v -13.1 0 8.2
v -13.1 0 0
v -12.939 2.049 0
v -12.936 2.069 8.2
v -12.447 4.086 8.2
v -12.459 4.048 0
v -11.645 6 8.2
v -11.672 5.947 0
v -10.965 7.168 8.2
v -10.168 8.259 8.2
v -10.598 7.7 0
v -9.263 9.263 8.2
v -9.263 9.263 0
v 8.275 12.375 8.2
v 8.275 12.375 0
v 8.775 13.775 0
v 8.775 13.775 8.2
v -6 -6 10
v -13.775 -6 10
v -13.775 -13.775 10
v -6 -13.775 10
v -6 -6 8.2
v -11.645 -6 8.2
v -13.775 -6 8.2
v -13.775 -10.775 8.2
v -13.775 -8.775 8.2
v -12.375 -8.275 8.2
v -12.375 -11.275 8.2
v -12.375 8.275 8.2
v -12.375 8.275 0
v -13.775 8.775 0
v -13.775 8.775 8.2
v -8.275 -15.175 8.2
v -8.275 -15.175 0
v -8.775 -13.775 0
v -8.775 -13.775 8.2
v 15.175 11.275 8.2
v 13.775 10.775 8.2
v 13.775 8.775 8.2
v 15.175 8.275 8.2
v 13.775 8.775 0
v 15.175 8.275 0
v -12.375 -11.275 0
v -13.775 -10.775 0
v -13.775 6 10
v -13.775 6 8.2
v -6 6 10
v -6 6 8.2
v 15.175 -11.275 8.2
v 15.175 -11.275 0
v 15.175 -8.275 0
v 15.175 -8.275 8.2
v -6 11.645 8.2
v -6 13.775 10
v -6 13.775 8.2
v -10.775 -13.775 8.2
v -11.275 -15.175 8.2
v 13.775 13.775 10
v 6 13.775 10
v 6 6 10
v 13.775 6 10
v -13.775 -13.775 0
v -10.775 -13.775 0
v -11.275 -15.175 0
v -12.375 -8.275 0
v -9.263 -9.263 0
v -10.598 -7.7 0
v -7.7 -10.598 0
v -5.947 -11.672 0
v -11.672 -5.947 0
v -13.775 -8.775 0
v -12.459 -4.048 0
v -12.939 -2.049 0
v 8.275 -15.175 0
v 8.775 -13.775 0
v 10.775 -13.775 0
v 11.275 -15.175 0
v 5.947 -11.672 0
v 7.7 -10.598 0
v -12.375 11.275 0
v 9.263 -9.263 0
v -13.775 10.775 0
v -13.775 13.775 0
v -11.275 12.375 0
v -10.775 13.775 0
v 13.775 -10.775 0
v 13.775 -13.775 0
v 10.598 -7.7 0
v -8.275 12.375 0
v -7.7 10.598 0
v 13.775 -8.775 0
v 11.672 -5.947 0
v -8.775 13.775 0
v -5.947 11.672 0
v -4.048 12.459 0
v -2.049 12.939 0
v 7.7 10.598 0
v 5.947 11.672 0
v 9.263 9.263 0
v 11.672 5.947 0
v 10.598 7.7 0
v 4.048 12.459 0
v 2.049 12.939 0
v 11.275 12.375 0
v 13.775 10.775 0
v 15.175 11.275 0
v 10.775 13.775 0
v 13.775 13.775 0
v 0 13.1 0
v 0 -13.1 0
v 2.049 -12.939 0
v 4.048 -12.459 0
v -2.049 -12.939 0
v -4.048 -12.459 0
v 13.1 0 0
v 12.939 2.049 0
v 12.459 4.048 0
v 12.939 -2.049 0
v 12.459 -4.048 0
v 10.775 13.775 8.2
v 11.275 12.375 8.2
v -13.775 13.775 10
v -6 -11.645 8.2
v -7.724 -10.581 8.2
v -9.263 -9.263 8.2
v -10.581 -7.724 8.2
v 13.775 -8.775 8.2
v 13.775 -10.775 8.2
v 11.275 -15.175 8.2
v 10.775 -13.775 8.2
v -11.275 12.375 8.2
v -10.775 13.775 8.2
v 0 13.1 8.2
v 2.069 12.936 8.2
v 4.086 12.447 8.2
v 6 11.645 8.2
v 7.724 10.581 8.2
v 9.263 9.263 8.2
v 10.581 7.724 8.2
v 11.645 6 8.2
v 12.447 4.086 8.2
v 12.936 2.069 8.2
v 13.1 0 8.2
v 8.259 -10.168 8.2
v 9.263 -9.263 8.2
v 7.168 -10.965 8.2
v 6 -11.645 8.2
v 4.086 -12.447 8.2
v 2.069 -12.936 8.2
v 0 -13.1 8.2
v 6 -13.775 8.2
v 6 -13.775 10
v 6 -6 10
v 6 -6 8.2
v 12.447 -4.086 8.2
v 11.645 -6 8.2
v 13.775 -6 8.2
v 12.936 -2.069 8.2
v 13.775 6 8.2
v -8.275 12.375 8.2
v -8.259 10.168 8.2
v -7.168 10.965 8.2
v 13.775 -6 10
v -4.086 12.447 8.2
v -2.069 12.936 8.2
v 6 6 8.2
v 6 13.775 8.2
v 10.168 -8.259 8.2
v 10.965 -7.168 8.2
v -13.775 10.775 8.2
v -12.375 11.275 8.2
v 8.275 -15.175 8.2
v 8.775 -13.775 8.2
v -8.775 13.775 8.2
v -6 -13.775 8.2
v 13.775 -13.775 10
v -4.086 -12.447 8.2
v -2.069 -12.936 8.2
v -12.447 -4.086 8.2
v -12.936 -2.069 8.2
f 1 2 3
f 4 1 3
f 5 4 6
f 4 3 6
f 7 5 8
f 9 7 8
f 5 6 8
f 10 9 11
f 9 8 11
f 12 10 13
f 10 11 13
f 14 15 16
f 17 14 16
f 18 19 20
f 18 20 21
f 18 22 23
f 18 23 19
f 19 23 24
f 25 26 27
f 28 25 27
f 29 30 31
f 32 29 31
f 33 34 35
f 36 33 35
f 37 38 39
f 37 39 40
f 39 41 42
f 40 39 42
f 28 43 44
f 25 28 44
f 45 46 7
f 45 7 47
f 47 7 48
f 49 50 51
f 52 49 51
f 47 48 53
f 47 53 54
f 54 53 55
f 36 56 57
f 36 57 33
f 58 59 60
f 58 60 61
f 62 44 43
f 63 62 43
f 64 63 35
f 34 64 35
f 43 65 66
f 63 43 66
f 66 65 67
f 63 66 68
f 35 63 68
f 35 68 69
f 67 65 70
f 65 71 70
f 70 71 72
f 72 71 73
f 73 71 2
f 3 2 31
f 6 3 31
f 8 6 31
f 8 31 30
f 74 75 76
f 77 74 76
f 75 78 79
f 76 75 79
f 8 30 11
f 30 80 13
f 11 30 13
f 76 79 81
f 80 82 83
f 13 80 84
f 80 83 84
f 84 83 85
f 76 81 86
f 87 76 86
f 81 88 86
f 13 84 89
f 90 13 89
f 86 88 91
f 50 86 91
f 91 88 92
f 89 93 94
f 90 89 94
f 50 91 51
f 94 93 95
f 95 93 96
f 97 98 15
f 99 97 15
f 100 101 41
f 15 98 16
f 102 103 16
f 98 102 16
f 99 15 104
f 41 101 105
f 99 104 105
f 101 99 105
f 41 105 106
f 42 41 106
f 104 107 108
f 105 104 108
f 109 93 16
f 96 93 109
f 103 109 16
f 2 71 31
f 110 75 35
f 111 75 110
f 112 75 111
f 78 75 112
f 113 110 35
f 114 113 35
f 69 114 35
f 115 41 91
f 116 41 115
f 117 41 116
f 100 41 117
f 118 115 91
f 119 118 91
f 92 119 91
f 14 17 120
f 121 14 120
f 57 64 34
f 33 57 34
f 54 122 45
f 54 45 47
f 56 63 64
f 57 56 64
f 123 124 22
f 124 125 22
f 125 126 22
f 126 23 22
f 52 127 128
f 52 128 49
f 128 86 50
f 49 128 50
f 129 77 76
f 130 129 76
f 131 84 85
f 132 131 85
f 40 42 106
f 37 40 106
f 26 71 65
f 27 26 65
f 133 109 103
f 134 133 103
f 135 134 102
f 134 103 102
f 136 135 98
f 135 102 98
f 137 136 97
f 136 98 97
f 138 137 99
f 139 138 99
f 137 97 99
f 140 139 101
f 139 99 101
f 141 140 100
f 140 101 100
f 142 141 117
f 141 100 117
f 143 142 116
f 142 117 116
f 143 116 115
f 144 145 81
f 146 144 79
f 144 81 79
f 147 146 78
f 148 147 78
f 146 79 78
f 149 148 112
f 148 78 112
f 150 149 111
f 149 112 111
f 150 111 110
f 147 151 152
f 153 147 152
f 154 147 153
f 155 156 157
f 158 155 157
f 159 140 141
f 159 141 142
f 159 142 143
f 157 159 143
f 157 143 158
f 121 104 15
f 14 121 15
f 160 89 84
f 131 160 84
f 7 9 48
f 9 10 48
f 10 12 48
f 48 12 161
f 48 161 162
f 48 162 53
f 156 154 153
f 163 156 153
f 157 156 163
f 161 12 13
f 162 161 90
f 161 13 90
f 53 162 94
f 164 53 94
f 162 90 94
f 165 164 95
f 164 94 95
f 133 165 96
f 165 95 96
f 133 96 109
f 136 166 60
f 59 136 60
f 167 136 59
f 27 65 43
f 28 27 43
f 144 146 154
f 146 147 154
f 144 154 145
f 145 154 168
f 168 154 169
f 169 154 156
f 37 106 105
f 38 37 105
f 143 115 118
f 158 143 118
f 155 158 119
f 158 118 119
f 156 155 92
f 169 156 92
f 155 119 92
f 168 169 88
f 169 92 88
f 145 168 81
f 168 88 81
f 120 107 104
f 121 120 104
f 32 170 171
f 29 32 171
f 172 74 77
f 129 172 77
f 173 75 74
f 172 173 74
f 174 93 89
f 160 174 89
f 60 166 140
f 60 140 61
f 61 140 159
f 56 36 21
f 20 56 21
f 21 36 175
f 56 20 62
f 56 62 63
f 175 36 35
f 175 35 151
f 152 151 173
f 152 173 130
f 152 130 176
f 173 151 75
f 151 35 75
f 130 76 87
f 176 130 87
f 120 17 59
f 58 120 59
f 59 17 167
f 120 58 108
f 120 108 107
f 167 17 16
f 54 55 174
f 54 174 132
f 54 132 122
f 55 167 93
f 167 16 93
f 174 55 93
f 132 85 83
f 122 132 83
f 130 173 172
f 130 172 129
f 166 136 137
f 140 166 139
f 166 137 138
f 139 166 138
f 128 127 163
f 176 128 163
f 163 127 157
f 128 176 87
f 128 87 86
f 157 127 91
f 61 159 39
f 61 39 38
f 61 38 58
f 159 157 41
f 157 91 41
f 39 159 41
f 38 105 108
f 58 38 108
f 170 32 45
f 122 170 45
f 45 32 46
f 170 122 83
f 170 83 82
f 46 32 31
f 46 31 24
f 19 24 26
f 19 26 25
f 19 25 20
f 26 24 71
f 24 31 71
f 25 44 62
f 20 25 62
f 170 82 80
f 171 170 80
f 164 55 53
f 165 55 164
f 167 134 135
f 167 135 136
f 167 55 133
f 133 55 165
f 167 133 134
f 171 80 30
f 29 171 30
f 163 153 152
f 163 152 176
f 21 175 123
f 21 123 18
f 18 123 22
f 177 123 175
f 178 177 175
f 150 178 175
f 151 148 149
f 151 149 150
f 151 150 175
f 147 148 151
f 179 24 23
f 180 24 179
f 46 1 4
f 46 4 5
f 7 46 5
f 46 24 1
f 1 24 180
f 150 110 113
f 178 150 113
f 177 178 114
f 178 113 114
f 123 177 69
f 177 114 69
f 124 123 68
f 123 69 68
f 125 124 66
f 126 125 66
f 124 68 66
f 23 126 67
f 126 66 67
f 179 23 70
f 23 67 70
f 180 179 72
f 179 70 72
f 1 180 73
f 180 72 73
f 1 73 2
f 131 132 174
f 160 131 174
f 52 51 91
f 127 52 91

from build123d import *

# Parameters (mm, degrees)
F1_DEPTH = 8.2
F2_W     = 7.775
F2_H     = 7.775
F3_DEPTH = 1.8


# Not quite as in the source:
# - a feature names something its author has since deleted; it is built from what else it names


with BuildPart() as f1:
    # F0 (on Top) → F1 (new body)
    with BuildSketch(Plane.XY):
        with BuildLine():
            Line((13.775, 10.775), (13.775, 13.775))
            Line((13.775, 13.775), (10.775, 13.775))
            Line((10.775, 13.775), (11.275, 12.375))
            Line((11.275, 12.375), (8.275, 12.375))
            Line((8.275, 12.375), (8.775, 13.775))
            Line((8.775, 13.775), (0, 13.775))
            Line((0, 13.775), (0, 13.1))
            ThreePointArc((0, 13.1), (9.2630988335, 9.2630988335), (13.1, 0))
            Line((13.1, 0), (13.775, 0))
            Line((13.775, 0), (13.775, 8.775))
            Line((13.775, 8.775), (13.775, 10.775))
        make_face()
        Polygon((15.175, 11.275), (13.775, 10.775), (13.775, 8.775), (15.175, 8.275), align=None)
        Polygon((15.175, -8.275), (13.775, -8.775), (13.775, -10.775), (15.175, -11.275), align=None)
        with BuildLine():
            Line((13.775, -8.775), (13.775, 0))
            Line((13.775, 0), (13.1, 0))
            ThreePointArc((13.1, 0), (12.1028218759, -5.013152964), (9.2630988335, -9.2630988335))
            Line((9.2630988335, -9.2630988335), (13.775, -13.775))
            Line((13.775, -13.775), (13.775, -10.775))
            Line((13.775, -10.775), (13.775, -8.775))
        make_face()
        with BuildLine():
            Line((13.775, -13.775), (9.2630988335, -9.2630988335))
            ThreePointArc((9.2630988335, -9.2630988335), (5.013152964, -12.1028218759), (0, -13.1))
            Line((0, -13.1), (0, -13.775))
            Line((0, -13.775), (8.775, -13.775))
            Line((8.775, -13.775), (10.775, -13.775))
            Line((10.775, -13.775), (13.775, -13.775))
        make_face()
        Polygon((11.275, -15.175), (10.775, -13.775), (8.775, -13.775), (8.275, -15.175), align=None)
        with BuildLine():
            ThreePointArc((0, -13.1), (-9.2630988335, -9.2630988335), (-13.1, 0))
            Line((-13.1, 0), (-13.775, 0))
            Line((-13.775, 0), (-13.775, -8.775))
            Line((-13.775, -8.775), (-12.375, -8.275))
            Line((-12.375, -8.275), (-12.375, -11.275))
            Line((-12.375, -11.275), (-13.775, -10.775))
            Line((-13.775, -10.775), (-13.775, -13.775))
            Line((-13.775, -13.775), (-10.775, -13.775))
            Line((-10.775, -13.775), (-8.775, -13.775))
            Line((-8.775, -13.775), (0, -13.775))
            Line((0, -13.775), (0, -13.1))
        make_face()
        Polygon((-8.275, -15.175), (-8.775, -13.775), (-10.775, -13.775), (-11.275, -15.175), align=None)
        with BuildLine():
            ThreePointArc((-13.1, 0), (-12.1028218759, 5.013152964), (-9.2630988335, 9.2630988335))
            Line((-9.2630988335, 9.2630988335), (-13.775, 13.775))
            Line((-13.775, 13.775), (-13.775, 10.775))
            Line((-13.775, 10.775), (-12.375, 11.275))
            Line((-12.375, 11.275), (-12.375, 8.275))
            Line((-12.375, 8.275), (-13.775, 8.775))
            Line((-13.775, 8.775), (-13.775, 0))
            Line((-13.775, 0), (-13.1, 0))
        make_face()
        with BuildLine():
            Line((0, 13.1), (0, 13.775))
            Line((0, 13.775), (-8.775, 13.775))
            Line((-8.775, 13.775), (-8.275, 12.375))
            Line((-8.275, 12.375), (-9.775, 12.375))
            Line((-9.775, 12.375), (-11.275, 12.375))
            Line((-11.275, 12.375), (-10.775, 13.775))
            Line((-10.775, 13.775), (-13.775, 13.775))
            Line((-13.775, 13.775), (-9.2630988335, 9.2630988335))
            ThreePointArc((-9.2630988335, 9.2630988335), (-5.013152964, 12.1028218759), (0, 13.1))
        make_face()
    extrude(amount=F1_DEPTH)

    # F2 (on face) → F3 (join)
    with BuildSketch(Plane.XY.offset(8.2)):
        Polygon((-6, 13.775), (-13.775, 13.775), (-6, 6), align=None)
        Polygon((-6, -13.775), (-6, -6), (-13.775, -13.775), align=None)
        Polygon((-13.775, -13.775), (-6, -6), (-13.775, -6), align=None)
        Polygon((-6, 6), (-13.775, 13.775), (-13.775, 6), align=None)
        with Locations((9.8875, -9.8875)):
            Rectangle(F2_W, F2_H)
        with Locations((9.8875, 9.8875)):
            Rectangle(F2_W, F2_H)
    extrude(amount=F3_DEPTH)


solid = f1.part
